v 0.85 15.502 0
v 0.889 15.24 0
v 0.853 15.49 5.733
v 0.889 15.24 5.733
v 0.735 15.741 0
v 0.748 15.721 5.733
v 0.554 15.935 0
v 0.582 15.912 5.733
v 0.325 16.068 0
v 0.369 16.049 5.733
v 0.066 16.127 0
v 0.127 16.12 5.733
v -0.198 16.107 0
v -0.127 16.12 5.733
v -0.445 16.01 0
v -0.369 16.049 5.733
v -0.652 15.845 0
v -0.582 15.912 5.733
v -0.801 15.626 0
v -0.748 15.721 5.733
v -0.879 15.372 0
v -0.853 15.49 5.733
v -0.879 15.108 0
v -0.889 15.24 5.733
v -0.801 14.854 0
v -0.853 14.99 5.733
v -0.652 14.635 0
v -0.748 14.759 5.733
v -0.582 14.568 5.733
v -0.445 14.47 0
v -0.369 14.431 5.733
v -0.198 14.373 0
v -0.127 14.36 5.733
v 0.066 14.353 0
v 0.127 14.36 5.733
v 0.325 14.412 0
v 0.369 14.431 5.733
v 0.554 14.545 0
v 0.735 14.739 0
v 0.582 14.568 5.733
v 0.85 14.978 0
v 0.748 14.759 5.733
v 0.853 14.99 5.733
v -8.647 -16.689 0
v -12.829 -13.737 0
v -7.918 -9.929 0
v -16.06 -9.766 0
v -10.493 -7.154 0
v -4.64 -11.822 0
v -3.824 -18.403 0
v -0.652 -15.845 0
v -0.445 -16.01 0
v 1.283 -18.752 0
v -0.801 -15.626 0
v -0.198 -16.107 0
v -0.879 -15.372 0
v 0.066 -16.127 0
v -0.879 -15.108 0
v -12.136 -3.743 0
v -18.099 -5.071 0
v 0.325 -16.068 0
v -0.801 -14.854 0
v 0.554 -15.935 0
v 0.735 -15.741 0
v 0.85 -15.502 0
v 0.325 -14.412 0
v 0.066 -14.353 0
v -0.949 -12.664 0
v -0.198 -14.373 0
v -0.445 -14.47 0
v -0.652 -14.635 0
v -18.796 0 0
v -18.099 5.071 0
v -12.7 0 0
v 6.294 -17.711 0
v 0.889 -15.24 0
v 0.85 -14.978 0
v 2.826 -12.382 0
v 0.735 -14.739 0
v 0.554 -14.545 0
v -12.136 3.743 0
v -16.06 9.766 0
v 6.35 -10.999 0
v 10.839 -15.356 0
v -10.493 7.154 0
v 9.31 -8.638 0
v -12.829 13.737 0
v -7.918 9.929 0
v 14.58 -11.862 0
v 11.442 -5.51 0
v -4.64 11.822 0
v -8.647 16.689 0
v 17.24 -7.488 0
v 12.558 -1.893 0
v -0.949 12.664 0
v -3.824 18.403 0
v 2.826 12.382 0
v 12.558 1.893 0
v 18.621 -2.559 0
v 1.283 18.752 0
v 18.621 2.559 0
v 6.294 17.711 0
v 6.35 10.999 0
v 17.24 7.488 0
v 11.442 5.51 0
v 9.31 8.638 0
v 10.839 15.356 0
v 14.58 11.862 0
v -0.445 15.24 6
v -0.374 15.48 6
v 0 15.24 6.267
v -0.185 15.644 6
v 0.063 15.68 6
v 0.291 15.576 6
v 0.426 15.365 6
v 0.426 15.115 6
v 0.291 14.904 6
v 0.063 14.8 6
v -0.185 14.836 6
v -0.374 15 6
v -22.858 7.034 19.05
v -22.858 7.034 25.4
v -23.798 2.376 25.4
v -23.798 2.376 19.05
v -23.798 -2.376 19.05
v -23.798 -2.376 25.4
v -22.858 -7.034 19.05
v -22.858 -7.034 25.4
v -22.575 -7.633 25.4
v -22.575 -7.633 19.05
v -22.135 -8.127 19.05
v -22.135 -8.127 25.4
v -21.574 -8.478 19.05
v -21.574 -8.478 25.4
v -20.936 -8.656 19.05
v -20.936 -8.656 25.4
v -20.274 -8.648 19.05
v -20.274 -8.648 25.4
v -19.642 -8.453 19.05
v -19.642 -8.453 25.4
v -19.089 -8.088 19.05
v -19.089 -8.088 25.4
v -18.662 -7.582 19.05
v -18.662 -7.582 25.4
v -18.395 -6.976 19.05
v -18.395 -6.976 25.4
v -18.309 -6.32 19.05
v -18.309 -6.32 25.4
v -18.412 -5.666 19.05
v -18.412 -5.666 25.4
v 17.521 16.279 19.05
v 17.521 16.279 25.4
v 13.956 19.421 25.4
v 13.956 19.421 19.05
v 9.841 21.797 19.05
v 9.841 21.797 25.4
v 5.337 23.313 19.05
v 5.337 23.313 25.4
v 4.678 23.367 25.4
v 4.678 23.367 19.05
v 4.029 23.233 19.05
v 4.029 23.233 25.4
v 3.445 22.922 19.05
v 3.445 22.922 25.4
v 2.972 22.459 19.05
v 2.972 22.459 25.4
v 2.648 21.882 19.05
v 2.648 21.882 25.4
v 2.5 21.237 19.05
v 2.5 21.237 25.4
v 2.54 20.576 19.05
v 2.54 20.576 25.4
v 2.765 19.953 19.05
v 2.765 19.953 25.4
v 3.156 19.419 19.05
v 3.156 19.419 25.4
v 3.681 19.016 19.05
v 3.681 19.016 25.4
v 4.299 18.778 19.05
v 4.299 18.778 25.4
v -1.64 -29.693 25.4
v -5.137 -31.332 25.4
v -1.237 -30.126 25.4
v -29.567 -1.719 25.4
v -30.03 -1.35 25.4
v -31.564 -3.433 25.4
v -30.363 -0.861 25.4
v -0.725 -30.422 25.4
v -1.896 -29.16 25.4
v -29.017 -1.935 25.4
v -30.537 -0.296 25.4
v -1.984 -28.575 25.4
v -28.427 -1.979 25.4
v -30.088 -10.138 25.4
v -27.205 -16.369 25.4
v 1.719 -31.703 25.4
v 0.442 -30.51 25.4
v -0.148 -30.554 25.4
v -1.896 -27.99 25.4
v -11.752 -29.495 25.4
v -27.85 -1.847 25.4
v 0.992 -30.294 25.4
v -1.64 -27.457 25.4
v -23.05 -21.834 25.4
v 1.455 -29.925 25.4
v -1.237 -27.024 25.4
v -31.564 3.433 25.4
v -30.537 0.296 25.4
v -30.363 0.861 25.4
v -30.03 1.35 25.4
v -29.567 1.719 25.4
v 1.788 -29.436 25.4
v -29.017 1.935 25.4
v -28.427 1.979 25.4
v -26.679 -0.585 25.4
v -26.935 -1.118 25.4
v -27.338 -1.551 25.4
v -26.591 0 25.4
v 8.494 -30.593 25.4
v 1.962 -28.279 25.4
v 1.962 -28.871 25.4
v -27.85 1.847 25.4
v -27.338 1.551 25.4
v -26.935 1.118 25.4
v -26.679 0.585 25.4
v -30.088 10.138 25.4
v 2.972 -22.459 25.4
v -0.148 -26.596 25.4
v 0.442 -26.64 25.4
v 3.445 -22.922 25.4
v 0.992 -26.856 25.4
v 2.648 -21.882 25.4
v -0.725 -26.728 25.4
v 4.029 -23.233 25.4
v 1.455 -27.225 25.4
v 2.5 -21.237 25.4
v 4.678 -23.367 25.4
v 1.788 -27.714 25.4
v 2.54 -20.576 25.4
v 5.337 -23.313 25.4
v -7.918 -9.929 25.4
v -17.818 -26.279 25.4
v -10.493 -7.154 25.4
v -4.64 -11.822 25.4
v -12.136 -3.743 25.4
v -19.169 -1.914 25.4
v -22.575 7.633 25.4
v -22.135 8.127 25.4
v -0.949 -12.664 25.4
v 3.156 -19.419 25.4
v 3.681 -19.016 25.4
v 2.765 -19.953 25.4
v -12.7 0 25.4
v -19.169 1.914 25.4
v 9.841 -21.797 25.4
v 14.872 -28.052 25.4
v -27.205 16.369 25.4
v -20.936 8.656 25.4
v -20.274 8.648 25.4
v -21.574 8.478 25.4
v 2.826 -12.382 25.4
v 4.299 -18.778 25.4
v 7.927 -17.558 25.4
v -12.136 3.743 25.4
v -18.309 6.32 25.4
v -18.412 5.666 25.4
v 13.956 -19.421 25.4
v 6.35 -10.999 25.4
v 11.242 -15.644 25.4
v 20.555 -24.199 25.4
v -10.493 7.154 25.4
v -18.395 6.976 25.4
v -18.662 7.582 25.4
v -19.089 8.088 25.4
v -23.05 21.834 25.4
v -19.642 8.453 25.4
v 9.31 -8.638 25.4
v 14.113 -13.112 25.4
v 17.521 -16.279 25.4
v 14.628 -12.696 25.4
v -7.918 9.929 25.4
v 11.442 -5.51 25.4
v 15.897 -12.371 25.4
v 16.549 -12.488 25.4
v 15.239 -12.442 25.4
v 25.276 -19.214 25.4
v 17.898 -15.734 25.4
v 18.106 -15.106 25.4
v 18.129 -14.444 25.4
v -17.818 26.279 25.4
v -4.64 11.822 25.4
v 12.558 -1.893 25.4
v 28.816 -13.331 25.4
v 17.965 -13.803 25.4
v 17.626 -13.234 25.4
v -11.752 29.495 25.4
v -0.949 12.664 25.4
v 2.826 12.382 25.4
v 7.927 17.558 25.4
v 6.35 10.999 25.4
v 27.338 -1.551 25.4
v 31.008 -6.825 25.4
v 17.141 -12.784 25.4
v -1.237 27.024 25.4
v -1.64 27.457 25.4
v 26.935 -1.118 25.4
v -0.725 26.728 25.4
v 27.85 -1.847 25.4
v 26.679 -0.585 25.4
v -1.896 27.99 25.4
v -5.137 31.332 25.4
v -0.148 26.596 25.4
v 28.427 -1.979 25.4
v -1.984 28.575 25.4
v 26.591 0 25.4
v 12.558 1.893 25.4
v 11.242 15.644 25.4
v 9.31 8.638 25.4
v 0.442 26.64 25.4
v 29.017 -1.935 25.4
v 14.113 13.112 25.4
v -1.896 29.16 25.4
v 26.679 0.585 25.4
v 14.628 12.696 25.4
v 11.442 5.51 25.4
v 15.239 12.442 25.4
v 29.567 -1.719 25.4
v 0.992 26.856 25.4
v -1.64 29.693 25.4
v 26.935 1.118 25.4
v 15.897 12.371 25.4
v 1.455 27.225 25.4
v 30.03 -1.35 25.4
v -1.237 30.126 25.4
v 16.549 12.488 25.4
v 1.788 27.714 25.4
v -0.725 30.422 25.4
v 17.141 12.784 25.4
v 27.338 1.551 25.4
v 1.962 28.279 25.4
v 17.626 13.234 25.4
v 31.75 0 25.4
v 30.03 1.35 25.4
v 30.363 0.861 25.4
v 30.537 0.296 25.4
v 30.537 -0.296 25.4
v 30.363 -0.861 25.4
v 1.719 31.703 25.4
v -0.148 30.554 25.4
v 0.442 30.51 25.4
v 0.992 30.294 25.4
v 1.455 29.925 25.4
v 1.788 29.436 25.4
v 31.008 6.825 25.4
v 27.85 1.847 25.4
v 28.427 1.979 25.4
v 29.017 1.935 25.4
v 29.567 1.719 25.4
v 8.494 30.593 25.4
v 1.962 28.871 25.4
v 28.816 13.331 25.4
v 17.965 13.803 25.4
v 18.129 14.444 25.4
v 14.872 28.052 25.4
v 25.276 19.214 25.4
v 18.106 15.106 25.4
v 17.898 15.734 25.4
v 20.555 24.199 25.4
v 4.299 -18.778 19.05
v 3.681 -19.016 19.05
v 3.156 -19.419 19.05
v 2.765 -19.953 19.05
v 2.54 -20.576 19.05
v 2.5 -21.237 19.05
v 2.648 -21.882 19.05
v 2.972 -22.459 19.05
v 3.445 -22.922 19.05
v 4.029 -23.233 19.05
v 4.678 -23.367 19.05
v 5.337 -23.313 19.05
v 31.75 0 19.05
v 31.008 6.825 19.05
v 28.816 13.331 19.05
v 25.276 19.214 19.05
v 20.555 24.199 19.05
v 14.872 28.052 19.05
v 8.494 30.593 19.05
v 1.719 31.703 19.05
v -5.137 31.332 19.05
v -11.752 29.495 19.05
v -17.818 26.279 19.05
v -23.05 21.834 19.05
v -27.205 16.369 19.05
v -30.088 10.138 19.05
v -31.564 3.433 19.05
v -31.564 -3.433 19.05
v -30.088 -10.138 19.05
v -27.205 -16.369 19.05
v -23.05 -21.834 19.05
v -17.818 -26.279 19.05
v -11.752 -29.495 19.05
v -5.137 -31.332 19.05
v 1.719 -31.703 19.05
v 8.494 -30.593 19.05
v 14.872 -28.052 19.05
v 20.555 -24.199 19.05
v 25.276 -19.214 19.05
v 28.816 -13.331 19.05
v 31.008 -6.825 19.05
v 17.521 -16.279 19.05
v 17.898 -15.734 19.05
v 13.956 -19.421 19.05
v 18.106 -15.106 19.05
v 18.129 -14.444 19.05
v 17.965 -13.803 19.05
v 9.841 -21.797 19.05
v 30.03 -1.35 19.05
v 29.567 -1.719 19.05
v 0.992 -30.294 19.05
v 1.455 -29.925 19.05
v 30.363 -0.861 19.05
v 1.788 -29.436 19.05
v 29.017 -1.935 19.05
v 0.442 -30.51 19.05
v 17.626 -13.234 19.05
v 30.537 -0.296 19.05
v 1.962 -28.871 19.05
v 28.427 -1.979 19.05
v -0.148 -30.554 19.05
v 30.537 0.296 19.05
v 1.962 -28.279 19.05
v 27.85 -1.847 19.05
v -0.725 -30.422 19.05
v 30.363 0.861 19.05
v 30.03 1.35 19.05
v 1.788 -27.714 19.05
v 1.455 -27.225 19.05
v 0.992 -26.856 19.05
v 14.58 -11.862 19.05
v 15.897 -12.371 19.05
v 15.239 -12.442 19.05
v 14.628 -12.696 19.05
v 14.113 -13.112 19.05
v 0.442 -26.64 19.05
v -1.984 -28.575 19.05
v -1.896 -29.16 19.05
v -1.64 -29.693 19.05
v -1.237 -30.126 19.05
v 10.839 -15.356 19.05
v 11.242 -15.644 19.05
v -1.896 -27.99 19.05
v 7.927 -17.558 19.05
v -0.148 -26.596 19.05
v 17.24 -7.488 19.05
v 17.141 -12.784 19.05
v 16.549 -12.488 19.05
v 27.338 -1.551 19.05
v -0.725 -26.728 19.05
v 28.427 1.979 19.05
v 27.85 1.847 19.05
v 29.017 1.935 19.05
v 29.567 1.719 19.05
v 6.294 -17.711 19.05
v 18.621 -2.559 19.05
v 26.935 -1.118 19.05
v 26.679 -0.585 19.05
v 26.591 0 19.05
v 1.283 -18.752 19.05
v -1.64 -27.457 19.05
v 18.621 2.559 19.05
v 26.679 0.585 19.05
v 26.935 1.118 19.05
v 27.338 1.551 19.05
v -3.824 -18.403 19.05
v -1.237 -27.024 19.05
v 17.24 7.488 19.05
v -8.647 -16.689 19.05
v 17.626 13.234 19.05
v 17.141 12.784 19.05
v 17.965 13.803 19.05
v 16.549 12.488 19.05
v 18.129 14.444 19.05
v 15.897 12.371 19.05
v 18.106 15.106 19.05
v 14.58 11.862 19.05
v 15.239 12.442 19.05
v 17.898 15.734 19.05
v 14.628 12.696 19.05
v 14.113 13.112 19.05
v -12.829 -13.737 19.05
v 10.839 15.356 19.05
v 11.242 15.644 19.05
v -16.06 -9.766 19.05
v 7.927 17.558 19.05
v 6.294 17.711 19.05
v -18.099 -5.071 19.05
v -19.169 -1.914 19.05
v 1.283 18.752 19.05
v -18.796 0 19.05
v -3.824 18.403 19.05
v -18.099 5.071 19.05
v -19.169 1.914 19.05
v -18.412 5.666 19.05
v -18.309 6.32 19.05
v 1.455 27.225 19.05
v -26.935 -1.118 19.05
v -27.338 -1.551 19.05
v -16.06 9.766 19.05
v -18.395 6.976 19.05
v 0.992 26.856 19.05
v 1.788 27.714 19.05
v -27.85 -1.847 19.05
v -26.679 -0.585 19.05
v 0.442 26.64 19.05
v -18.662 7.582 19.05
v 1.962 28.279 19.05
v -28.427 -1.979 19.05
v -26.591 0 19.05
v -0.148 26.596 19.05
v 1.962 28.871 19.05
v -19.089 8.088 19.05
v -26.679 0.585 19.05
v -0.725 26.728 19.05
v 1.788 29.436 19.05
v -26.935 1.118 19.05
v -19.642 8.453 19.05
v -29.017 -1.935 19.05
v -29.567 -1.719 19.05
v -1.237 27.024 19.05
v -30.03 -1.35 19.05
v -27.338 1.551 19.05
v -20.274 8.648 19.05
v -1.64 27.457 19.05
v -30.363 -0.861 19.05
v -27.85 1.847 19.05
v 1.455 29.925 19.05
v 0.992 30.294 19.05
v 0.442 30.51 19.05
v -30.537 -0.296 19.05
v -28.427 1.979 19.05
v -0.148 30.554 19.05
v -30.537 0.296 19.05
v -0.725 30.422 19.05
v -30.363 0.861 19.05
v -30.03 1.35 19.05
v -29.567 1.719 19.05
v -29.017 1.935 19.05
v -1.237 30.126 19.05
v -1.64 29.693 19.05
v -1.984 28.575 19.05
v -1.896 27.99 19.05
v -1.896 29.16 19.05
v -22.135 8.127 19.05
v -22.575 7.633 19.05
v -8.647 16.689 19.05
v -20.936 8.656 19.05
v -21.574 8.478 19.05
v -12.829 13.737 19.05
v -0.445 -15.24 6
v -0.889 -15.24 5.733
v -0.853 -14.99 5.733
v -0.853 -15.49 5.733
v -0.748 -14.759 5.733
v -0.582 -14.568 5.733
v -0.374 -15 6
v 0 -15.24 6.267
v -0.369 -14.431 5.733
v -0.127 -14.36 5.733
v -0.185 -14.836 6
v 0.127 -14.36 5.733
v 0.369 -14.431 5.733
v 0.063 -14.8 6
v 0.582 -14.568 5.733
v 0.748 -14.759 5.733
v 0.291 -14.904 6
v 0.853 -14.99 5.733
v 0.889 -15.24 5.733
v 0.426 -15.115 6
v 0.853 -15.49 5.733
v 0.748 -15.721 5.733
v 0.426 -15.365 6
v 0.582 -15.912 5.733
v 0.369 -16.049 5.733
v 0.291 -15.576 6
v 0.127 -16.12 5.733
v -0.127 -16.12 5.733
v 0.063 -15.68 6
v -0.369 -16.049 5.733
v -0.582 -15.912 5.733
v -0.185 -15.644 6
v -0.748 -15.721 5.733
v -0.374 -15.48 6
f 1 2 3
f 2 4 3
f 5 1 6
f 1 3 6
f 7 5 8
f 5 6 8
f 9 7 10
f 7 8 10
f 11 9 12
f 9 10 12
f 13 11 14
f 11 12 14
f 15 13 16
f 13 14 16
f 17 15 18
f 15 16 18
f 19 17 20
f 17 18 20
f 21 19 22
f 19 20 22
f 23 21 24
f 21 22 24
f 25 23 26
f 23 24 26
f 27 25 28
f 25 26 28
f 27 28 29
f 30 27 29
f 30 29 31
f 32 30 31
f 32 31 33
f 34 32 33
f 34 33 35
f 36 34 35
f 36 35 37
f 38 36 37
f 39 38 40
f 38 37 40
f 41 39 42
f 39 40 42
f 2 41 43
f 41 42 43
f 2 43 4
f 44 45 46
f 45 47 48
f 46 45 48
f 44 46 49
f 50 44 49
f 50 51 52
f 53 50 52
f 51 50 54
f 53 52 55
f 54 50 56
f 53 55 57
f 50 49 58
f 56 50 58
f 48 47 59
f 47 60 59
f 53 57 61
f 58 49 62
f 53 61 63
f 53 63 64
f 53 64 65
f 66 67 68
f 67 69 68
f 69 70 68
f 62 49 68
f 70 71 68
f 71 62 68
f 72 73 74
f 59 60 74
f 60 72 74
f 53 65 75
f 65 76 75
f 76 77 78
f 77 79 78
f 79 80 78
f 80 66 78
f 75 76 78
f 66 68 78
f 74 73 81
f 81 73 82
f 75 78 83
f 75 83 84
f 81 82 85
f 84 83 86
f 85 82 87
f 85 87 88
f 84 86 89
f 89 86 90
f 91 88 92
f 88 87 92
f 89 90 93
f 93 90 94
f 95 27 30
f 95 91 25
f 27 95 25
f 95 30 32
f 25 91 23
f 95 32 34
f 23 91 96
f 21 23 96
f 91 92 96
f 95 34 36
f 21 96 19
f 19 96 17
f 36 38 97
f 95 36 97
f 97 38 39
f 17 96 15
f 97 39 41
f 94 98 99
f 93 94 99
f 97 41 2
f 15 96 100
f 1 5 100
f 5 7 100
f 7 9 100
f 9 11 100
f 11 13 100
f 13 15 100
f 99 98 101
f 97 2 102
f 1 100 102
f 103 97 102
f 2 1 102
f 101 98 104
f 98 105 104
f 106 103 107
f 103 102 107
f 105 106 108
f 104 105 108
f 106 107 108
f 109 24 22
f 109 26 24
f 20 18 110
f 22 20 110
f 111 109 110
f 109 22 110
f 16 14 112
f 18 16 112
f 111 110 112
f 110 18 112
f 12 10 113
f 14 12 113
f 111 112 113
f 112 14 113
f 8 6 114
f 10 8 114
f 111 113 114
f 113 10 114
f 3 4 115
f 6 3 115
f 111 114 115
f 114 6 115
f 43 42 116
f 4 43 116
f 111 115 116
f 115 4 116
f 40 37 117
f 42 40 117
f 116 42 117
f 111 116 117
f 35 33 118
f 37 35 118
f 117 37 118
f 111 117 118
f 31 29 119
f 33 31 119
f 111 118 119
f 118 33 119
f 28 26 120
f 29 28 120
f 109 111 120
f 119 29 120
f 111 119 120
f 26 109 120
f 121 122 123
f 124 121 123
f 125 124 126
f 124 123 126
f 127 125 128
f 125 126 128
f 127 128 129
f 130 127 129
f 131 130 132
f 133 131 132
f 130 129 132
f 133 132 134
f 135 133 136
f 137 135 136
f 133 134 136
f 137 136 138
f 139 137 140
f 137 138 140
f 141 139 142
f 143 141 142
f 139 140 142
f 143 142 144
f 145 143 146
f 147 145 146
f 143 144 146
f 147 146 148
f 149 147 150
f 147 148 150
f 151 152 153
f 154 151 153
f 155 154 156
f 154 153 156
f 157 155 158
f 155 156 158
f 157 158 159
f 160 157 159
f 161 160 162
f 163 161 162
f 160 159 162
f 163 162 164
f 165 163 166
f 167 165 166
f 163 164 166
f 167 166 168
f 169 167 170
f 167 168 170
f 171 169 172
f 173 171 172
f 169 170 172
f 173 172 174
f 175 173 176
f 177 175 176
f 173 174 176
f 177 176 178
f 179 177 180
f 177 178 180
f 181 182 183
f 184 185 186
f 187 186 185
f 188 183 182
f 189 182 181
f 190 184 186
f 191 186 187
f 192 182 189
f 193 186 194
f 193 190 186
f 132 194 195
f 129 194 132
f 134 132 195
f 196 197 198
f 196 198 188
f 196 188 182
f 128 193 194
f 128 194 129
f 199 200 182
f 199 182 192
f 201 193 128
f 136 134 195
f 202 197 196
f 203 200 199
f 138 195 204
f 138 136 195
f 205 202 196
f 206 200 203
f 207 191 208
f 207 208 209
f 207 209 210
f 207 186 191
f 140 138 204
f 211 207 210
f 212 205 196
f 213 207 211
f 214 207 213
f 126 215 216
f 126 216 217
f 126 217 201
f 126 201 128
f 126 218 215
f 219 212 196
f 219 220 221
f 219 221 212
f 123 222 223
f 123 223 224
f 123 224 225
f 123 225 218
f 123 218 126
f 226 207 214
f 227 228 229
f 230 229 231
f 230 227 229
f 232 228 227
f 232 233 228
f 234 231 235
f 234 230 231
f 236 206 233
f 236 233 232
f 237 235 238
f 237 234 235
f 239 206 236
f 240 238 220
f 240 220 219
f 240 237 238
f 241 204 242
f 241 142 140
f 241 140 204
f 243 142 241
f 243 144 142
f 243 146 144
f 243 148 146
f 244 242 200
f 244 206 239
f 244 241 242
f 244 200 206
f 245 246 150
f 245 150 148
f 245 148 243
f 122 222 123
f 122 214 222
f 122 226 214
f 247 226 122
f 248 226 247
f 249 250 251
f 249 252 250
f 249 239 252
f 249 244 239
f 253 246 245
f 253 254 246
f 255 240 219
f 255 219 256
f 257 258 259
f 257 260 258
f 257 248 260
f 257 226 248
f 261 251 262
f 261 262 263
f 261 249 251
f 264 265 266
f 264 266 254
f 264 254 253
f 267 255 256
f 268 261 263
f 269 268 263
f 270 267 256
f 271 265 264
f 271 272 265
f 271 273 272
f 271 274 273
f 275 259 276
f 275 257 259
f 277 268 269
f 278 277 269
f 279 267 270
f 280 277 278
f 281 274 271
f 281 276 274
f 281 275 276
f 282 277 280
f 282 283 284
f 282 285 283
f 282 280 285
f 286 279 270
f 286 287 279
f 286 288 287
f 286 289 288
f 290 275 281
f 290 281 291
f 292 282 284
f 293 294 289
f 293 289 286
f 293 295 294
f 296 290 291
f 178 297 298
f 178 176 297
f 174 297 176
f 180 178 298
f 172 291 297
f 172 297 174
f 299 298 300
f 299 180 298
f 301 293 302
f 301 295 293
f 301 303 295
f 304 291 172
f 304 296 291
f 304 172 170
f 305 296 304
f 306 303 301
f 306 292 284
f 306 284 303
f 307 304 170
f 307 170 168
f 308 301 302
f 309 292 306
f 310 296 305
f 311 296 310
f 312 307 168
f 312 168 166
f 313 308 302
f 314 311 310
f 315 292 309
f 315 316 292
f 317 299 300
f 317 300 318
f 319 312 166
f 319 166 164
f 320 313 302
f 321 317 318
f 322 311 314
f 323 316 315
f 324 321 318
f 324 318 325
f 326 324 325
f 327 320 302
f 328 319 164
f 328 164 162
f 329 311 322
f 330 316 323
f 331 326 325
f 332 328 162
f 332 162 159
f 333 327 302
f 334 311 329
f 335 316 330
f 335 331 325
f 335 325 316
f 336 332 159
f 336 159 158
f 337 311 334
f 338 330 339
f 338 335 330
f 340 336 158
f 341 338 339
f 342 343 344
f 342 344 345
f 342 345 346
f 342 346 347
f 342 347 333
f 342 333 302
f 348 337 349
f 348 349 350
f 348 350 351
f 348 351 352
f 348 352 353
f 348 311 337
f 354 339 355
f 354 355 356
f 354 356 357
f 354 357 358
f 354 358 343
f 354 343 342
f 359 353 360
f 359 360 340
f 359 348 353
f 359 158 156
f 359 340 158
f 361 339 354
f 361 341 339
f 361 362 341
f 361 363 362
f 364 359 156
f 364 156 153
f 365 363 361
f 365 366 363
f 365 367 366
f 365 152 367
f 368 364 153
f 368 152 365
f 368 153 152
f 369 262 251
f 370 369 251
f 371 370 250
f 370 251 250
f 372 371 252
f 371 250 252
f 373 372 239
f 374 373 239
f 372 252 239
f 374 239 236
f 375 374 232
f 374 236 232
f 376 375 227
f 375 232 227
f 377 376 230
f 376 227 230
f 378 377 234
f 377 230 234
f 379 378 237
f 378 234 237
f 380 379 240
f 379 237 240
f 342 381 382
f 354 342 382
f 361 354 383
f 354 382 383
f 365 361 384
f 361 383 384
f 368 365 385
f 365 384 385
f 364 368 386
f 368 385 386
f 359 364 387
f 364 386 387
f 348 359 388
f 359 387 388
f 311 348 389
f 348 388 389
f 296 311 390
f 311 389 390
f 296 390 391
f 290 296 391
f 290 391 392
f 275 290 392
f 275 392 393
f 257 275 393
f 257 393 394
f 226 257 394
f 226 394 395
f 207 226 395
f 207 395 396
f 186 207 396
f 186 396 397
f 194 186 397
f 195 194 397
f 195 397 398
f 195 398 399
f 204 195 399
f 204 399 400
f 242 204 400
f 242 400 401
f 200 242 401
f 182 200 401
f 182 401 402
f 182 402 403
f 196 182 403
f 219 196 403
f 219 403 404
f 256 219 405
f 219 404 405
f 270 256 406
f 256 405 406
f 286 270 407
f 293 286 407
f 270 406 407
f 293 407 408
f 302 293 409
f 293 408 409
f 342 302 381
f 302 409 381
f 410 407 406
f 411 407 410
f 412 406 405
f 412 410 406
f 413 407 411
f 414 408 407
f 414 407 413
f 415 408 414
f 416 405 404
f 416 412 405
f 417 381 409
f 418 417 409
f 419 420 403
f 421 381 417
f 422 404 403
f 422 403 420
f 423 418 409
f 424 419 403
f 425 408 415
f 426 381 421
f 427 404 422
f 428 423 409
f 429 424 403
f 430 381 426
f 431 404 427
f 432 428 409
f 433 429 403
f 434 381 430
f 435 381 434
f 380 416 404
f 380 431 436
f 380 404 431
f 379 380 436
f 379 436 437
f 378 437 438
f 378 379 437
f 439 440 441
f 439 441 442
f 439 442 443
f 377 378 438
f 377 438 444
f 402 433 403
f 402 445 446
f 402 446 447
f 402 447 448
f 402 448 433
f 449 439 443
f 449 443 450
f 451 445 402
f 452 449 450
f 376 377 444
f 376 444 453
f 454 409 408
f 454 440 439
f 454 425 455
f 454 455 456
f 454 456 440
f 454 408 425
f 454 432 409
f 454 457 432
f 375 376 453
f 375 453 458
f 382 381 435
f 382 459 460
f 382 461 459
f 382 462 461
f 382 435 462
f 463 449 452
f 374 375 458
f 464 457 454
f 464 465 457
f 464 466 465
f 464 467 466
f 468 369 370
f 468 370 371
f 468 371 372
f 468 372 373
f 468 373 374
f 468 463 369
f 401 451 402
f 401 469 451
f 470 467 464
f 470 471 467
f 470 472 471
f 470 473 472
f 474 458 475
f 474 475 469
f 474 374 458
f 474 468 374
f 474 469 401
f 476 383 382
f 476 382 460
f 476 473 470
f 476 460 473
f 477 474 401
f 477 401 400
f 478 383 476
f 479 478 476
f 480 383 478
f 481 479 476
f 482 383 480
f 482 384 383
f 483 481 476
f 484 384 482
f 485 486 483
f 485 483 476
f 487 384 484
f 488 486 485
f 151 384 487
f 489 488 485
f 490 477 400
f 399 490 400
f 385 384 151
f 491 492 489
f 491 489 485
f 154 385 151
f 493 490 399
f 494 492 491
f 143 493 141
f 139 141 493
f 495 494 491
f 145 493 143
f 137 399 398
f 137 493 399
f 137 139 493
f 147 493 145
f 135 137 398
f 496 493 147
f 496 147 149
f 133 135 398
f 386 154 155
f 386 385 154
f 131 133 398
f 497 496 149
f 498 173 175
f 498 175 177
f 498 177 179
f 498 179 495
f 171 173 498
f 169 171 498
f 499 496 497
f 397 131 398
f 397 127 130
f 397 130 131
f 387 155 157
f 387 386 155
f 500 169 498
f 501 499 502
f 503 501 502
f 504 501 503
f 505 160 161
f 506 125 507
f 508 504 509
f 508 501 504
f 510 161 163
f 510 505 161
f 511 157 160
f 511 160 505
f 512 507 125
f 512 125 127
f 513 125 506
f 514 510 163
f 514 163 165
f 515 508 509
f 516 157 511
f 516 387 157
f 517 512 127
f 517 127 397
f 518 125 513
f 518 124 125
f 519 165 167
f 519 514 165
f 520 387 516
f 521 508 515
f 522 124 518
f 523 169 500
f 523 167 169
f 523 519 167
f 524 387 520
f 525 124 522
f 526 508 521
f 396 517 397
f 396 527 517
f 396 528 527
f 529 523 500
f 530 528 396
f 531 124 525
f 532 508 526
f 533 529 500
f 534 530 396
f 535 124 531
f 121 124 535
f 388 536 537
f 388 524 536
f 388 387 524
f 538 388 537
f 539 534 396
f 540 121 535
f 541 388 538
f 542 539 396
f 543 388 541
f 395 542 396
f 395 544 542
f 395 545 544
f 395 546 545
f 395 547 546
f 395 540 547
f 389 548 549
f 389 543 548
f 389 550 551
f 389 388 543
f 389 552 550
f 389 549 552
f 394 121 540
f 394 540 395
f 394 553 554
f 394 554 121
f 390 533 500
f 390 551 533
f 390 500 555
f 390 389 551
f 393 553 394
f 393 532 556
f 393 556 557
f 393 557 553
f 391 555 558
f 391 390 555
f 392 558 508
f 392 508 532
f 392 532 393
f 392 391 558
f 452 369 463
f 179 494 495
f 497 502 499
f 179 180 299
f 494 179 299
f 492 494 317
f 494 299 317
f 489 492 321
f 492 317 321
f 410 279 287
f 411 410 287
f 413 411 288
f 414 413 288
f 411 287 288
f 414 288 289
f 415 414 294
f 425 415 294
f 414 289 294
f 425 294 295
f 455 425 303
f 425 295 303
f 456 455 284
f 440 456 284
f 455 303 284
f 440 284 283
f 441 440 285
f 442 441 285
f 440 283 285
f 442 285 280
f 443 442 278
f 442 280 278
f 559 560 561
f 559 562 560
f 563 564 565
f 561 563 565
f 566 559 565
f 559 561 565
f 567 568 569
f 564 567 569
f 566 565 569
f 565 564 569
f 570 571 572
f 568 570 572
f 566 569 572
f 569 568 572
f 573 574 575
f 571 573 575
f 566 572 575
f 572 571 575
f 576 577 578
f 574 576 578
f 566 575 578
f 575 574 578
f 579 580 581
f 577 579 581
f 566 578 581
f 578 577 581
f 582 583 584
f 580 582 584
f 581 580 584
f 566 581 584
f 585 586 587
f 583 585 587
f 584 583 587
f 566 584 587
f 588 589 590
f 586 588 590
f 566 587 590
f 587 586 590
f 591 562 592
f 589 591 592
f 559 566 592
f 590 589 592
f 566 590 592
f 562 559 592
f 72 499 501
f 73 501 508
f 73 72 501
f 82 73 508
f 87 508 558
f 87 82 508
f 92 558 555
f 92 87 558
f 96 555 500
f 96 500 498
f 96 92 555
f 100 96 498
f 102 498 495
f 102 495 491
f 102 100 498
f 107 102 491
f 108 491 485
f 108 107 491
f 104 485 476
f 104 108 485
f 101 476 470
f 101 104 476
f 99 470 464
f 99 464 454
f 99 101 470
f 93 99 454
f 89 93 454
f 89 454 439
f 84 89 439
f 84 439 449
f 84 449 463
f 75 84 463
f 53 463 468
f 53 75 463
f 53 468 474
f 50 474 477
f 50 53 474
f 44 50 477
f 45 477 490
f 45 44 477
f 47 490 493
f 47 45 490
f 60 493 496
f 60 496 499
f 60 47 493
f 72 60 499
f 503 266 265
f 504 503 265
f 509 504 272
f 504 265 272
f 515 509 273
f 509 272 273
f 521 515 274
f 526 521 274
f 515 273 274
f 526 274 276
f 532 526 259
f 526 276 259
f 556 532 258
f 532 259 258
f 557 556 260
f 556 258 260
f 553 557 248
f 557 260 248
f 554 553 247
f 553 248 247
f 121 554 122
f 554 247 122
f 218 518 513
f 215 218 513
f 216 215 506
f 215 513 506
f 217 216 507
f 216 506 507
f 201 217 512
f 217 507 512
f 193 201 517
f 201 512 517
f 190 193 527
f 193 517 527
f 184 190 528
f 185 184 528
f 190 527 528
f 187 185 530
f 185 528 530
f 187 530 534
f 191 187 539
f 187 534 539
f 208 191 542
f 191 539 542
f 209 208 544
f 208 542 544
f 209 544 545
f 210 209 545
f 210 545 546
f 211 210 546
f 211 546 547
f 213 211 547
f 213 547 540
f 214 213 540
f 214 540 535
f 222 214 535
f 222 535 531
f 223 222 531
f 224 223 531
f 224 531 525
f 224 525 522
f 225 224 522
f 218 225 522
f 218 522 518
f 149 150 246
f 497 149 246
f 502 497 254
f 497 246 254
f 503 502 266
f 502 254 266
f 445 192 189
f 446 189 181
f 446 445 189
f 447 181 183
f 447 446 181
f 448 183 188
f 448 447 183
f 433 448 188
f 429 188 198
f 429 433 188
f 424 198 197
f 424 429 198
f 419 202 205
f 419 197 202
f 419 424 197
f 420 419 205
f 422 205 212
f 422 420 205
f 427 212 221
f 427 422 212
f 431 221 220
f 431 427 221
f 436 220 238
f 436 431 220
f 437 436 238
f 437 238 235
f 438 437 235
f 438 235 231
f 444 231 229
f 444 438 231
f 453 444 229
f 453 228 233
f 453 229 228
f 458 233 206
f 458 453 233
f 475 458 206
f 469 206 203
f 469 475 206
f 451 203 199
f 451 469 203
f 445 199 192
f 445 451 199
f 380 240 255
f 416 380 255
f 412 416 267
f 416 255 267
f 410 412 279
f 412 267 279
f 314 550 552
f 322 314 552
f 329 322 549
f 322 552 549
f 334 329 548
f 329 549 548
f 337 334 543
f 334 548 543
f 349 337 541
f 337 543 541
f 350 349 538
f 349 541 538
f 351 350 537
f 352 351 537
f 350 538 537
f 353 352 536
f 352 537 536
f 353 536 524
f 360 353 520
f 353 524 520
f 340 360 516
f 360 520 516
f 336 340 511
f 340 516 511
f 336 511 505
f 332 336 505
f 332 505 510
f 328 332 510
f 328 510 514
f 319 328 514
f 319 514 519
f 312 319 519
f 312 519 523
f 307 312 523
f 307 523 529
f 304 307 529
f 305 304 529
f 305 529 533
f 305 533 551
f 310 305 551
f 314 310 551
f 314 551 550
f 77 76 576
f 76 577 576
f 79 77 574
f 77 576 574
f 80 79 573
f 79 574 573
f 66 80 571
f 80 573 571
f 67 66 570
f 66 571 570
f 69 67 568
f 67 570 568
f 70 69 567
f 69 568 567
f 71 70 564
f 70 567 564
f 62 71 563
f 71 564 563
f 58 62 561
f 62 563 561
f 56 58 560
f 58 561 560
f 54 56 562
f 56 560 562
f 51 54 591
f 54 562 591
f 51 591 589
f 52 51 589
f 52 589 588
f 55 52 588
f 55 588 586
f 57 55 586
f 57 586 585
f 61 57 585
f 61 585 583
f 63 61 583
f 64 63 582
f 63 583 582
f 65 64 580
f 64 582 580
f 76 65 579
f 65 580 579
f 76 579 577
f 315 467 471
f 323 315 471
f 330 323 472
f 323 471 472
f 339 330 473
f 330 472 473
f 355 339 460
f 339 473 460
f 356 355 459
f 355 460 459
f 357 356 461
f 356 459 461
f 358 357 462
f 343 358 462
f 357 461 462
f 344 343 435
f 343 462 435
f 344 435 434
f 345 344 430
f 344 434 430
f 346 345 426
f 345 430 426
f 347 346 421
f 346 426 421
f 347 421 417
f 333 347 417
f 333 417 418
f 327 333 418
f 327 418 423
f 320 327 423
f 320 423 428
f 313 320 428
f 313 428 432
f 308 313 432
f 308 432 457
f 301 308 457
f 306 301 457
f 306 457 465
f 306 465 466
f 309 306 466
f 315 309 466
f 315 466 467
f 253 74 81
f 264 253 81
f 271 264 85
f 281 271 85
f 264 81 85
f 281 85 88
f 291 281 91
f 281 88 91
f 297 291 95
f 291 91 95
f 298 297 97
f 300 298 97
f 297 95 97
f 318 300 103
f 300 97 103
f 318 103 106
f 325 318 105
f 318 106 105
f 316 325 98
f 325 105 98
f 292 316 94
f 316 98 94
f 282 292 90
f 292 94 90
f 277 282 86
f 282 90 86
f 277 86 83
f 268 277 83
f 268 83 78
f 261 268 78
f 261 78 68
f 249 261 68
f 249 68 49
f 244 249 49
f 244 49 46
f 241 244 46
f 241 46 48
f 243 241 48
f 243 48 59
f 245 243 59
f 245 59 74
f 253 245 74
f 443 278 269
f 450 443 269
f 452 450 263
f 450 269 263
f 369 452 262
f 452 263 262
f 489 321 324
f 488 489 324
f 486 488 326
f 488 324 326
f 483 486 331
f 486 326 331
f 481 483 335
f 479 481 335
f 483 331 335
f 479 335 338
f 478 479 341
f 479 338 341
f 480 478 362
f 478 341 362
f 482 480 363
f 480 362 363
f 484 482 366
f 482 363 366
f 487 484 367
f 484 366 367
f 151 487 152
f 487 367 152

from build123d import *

# Parameters (mm, degrees)
SKETCH1_R                       = 31.75
BOSS_EXTRUDE1_DEPTH             = 25.4
SKETCH2_OUTSIDE_W               = 84.166
SKETCH2_OUTSIDE_H               = 84.166
SKETCH2_OUTSIDE_R               = 18.796
CUT_EXTRUDE1_DEPTH              = 19.05
SKETCH3_R                       = 12.7
CUT_EXTRUDE2_DEPTH              = 26.4
F_2_56_TAPPED_HOLE1_D           = 1.778
F_2_56_TAPPED_HOLE1_DEPTH       = 5.73278
F_2_56_TAPPED_HOLE1_TIP         = 0.53416509
F_5_32_0_15625_DIAMETER_HOLE1_D = 3.96875
MIRROR2_COPY_1_D                = 3.96875
MIRROR2_COPY_2_D                = 3.96875
CUT_EXTRUDE3_DEPTH              = 26.4
CIRPATTERN1_COUNT               = 3
SKETCH10_R                      = 10.16
SKETCH10_R_2                    = 7.9375
CUT_EXTRUDE4_DEPTH              = 3.175


with BuildPart() as part:
    # Sketch1 → Boss-Extrude1 (new body)
    with BuildSketch(Plane.XY):
        Circle(SKETCH1_R)
    extrude(amount=BOSS_EXTRUDE1_DEPTH)

    # Sketch2 outside → Cut-Extrude1 (cut)
    with BuildSketch(Plane(origin=(0, 0, 0), x_dir=(-1, 0, 0), z_dir=(0, 0, -1))):
        Rectangle(SKETCH2_OUTSIDE_W, SKETCH2_OUTSIDE_H)
        Circle(SKETCH2_OUTSIDE_R, mode=Mode.SUBTRACT)
    extrude(amount=-CUT_EXTRUDE1_DEPTH, mode=Mode.SUBTRACT)

    # Sketch3 → Cut-Extrude2 (cut, through all)
    with BuildSketch(Plane(origin=(0, 0, 0), x_dir=(-1, 0, 0), z_dir=(0, 0, -1))):
        Circle(SKETCH3_R)
    extrude(amount=-CUT_EXTRUDE2_DEPTH, mode=Mode.SUBTRACT)

    # #2-56 Tapped Hole1
    with Locations(Plane(origin=(0, 0, 0), x_dir=(-1, 0, 0), z_dir=(0, 0, -1))):
        with Locations((0, 15.24), (0, -15.24)):
            Hole(F_2_56_TAPPED_HOLE1_D / 2, depth=F_2_56_TAPPED_HOLE1_DEPTH)
            with Locations((0, 0, -(F_2_56_TAPPED_HOLE1_DEPTH + F_2_56_TAPPED_HOLE1_TIP / 2))):  # 118° drill point
                Cone(0, F_2_56_TAPPED_HOLE1_D / 2, F_2_56_TAPPED_HOLE1_TIP, mode=Mode.SUBTRACT)

    # 5/32 (0.15625) Diameter Hole1 (through all)
    with Locations(Plane.XY.offset(25.4)):
        with Locations((0, 28.575), (28.575, 0)):
            f_5_32_0_15625_diameter_hole1 = Hole(F_5_32_0_15625_DIAMETER_HOLE1_D / 2)

    # Mirror1: 5/32 (0.15625) Diameter Hole1 across plane
    add(f_5_32_0_15625_diameter_hole1.mirror(Plane.ZX), mode=Mode.SUBTRACT)

    # Mirror2 copy 1 (through all)
    with Locations(Plane(origin=(0, 0, 25.4), x_dir=(-1, 0, 0), z_dir=(0, 0, 1))):
        with Locations((0, 28.575), (28.575, 0)):
            Hole(MIRROR2_COPY_1_D / 2)

    # Mirror2 copy 2 (through all)
    with Locations(Plane(origin=(0, 0, 25.4), x_dir=(-1, 0, 0), z_dir=(0, 0, 1))):
        with Locations((0, -28.575), (28.575, 0)):
            Hole(MIRROR2_COPY_2_D / 2)

    # Sketch9 → Cut-Extrude3 (cut, through all)
    with BuildSketch(Plane.XY.offset(25.4)):
        with BuildLine():
            ThreePointArc((17.520714904, 16.278611836), (11.957933079, 20.711747646), (5.337333936, 23.312690118))
            ThreePointArc((5.337333936, 23.312690118), (2.551061387, 21.564550521), (4.299200984, 18.778277972))
            ThreePointArc((4.299200984, 18.778277972), (9.632066921, 16.683229289), (14.112865271, 13.112356254))
            ThreePointArc((14.112865271, 13.112356254), (17.399917879, 12.991559228), (17.520714904, 16.278611836))
        make_face()
    cut_extrude3 = extrude(amount=-CUT_EXTRUDE3_DEPTH, mode=Mode.SUBTRACT)

    # CirPattern1: Cut-Extrude3 ×3 about axis
    cirpattern1_axis = Axis((0, 0, 0), (0, 0, 1))
    for i in range(1, CIRPATTERN1_COUNT):
        add(cut_extrude3.rotate(cirpattern1_axis, i * 360 / CIRPATTERN1_COUNT), mode=Mode.SUBTRACT)

    # Sketch10 → Cut-Extrude4 (cut)
    with BuildSketch(Plane(origin=(0, 0, 0), x_dir=(-1, 0, 0), z_dir=(0, 0, -1))):
        Circle(SKETCH10_R)
        Circle(SKETCH10_R_2, mode=Mode.SUBTRACT)
    extrude(amount=-CUT_EXTRUDE4_DEPTH, mode=Mode.SUBTRACT)


solid = part.part
